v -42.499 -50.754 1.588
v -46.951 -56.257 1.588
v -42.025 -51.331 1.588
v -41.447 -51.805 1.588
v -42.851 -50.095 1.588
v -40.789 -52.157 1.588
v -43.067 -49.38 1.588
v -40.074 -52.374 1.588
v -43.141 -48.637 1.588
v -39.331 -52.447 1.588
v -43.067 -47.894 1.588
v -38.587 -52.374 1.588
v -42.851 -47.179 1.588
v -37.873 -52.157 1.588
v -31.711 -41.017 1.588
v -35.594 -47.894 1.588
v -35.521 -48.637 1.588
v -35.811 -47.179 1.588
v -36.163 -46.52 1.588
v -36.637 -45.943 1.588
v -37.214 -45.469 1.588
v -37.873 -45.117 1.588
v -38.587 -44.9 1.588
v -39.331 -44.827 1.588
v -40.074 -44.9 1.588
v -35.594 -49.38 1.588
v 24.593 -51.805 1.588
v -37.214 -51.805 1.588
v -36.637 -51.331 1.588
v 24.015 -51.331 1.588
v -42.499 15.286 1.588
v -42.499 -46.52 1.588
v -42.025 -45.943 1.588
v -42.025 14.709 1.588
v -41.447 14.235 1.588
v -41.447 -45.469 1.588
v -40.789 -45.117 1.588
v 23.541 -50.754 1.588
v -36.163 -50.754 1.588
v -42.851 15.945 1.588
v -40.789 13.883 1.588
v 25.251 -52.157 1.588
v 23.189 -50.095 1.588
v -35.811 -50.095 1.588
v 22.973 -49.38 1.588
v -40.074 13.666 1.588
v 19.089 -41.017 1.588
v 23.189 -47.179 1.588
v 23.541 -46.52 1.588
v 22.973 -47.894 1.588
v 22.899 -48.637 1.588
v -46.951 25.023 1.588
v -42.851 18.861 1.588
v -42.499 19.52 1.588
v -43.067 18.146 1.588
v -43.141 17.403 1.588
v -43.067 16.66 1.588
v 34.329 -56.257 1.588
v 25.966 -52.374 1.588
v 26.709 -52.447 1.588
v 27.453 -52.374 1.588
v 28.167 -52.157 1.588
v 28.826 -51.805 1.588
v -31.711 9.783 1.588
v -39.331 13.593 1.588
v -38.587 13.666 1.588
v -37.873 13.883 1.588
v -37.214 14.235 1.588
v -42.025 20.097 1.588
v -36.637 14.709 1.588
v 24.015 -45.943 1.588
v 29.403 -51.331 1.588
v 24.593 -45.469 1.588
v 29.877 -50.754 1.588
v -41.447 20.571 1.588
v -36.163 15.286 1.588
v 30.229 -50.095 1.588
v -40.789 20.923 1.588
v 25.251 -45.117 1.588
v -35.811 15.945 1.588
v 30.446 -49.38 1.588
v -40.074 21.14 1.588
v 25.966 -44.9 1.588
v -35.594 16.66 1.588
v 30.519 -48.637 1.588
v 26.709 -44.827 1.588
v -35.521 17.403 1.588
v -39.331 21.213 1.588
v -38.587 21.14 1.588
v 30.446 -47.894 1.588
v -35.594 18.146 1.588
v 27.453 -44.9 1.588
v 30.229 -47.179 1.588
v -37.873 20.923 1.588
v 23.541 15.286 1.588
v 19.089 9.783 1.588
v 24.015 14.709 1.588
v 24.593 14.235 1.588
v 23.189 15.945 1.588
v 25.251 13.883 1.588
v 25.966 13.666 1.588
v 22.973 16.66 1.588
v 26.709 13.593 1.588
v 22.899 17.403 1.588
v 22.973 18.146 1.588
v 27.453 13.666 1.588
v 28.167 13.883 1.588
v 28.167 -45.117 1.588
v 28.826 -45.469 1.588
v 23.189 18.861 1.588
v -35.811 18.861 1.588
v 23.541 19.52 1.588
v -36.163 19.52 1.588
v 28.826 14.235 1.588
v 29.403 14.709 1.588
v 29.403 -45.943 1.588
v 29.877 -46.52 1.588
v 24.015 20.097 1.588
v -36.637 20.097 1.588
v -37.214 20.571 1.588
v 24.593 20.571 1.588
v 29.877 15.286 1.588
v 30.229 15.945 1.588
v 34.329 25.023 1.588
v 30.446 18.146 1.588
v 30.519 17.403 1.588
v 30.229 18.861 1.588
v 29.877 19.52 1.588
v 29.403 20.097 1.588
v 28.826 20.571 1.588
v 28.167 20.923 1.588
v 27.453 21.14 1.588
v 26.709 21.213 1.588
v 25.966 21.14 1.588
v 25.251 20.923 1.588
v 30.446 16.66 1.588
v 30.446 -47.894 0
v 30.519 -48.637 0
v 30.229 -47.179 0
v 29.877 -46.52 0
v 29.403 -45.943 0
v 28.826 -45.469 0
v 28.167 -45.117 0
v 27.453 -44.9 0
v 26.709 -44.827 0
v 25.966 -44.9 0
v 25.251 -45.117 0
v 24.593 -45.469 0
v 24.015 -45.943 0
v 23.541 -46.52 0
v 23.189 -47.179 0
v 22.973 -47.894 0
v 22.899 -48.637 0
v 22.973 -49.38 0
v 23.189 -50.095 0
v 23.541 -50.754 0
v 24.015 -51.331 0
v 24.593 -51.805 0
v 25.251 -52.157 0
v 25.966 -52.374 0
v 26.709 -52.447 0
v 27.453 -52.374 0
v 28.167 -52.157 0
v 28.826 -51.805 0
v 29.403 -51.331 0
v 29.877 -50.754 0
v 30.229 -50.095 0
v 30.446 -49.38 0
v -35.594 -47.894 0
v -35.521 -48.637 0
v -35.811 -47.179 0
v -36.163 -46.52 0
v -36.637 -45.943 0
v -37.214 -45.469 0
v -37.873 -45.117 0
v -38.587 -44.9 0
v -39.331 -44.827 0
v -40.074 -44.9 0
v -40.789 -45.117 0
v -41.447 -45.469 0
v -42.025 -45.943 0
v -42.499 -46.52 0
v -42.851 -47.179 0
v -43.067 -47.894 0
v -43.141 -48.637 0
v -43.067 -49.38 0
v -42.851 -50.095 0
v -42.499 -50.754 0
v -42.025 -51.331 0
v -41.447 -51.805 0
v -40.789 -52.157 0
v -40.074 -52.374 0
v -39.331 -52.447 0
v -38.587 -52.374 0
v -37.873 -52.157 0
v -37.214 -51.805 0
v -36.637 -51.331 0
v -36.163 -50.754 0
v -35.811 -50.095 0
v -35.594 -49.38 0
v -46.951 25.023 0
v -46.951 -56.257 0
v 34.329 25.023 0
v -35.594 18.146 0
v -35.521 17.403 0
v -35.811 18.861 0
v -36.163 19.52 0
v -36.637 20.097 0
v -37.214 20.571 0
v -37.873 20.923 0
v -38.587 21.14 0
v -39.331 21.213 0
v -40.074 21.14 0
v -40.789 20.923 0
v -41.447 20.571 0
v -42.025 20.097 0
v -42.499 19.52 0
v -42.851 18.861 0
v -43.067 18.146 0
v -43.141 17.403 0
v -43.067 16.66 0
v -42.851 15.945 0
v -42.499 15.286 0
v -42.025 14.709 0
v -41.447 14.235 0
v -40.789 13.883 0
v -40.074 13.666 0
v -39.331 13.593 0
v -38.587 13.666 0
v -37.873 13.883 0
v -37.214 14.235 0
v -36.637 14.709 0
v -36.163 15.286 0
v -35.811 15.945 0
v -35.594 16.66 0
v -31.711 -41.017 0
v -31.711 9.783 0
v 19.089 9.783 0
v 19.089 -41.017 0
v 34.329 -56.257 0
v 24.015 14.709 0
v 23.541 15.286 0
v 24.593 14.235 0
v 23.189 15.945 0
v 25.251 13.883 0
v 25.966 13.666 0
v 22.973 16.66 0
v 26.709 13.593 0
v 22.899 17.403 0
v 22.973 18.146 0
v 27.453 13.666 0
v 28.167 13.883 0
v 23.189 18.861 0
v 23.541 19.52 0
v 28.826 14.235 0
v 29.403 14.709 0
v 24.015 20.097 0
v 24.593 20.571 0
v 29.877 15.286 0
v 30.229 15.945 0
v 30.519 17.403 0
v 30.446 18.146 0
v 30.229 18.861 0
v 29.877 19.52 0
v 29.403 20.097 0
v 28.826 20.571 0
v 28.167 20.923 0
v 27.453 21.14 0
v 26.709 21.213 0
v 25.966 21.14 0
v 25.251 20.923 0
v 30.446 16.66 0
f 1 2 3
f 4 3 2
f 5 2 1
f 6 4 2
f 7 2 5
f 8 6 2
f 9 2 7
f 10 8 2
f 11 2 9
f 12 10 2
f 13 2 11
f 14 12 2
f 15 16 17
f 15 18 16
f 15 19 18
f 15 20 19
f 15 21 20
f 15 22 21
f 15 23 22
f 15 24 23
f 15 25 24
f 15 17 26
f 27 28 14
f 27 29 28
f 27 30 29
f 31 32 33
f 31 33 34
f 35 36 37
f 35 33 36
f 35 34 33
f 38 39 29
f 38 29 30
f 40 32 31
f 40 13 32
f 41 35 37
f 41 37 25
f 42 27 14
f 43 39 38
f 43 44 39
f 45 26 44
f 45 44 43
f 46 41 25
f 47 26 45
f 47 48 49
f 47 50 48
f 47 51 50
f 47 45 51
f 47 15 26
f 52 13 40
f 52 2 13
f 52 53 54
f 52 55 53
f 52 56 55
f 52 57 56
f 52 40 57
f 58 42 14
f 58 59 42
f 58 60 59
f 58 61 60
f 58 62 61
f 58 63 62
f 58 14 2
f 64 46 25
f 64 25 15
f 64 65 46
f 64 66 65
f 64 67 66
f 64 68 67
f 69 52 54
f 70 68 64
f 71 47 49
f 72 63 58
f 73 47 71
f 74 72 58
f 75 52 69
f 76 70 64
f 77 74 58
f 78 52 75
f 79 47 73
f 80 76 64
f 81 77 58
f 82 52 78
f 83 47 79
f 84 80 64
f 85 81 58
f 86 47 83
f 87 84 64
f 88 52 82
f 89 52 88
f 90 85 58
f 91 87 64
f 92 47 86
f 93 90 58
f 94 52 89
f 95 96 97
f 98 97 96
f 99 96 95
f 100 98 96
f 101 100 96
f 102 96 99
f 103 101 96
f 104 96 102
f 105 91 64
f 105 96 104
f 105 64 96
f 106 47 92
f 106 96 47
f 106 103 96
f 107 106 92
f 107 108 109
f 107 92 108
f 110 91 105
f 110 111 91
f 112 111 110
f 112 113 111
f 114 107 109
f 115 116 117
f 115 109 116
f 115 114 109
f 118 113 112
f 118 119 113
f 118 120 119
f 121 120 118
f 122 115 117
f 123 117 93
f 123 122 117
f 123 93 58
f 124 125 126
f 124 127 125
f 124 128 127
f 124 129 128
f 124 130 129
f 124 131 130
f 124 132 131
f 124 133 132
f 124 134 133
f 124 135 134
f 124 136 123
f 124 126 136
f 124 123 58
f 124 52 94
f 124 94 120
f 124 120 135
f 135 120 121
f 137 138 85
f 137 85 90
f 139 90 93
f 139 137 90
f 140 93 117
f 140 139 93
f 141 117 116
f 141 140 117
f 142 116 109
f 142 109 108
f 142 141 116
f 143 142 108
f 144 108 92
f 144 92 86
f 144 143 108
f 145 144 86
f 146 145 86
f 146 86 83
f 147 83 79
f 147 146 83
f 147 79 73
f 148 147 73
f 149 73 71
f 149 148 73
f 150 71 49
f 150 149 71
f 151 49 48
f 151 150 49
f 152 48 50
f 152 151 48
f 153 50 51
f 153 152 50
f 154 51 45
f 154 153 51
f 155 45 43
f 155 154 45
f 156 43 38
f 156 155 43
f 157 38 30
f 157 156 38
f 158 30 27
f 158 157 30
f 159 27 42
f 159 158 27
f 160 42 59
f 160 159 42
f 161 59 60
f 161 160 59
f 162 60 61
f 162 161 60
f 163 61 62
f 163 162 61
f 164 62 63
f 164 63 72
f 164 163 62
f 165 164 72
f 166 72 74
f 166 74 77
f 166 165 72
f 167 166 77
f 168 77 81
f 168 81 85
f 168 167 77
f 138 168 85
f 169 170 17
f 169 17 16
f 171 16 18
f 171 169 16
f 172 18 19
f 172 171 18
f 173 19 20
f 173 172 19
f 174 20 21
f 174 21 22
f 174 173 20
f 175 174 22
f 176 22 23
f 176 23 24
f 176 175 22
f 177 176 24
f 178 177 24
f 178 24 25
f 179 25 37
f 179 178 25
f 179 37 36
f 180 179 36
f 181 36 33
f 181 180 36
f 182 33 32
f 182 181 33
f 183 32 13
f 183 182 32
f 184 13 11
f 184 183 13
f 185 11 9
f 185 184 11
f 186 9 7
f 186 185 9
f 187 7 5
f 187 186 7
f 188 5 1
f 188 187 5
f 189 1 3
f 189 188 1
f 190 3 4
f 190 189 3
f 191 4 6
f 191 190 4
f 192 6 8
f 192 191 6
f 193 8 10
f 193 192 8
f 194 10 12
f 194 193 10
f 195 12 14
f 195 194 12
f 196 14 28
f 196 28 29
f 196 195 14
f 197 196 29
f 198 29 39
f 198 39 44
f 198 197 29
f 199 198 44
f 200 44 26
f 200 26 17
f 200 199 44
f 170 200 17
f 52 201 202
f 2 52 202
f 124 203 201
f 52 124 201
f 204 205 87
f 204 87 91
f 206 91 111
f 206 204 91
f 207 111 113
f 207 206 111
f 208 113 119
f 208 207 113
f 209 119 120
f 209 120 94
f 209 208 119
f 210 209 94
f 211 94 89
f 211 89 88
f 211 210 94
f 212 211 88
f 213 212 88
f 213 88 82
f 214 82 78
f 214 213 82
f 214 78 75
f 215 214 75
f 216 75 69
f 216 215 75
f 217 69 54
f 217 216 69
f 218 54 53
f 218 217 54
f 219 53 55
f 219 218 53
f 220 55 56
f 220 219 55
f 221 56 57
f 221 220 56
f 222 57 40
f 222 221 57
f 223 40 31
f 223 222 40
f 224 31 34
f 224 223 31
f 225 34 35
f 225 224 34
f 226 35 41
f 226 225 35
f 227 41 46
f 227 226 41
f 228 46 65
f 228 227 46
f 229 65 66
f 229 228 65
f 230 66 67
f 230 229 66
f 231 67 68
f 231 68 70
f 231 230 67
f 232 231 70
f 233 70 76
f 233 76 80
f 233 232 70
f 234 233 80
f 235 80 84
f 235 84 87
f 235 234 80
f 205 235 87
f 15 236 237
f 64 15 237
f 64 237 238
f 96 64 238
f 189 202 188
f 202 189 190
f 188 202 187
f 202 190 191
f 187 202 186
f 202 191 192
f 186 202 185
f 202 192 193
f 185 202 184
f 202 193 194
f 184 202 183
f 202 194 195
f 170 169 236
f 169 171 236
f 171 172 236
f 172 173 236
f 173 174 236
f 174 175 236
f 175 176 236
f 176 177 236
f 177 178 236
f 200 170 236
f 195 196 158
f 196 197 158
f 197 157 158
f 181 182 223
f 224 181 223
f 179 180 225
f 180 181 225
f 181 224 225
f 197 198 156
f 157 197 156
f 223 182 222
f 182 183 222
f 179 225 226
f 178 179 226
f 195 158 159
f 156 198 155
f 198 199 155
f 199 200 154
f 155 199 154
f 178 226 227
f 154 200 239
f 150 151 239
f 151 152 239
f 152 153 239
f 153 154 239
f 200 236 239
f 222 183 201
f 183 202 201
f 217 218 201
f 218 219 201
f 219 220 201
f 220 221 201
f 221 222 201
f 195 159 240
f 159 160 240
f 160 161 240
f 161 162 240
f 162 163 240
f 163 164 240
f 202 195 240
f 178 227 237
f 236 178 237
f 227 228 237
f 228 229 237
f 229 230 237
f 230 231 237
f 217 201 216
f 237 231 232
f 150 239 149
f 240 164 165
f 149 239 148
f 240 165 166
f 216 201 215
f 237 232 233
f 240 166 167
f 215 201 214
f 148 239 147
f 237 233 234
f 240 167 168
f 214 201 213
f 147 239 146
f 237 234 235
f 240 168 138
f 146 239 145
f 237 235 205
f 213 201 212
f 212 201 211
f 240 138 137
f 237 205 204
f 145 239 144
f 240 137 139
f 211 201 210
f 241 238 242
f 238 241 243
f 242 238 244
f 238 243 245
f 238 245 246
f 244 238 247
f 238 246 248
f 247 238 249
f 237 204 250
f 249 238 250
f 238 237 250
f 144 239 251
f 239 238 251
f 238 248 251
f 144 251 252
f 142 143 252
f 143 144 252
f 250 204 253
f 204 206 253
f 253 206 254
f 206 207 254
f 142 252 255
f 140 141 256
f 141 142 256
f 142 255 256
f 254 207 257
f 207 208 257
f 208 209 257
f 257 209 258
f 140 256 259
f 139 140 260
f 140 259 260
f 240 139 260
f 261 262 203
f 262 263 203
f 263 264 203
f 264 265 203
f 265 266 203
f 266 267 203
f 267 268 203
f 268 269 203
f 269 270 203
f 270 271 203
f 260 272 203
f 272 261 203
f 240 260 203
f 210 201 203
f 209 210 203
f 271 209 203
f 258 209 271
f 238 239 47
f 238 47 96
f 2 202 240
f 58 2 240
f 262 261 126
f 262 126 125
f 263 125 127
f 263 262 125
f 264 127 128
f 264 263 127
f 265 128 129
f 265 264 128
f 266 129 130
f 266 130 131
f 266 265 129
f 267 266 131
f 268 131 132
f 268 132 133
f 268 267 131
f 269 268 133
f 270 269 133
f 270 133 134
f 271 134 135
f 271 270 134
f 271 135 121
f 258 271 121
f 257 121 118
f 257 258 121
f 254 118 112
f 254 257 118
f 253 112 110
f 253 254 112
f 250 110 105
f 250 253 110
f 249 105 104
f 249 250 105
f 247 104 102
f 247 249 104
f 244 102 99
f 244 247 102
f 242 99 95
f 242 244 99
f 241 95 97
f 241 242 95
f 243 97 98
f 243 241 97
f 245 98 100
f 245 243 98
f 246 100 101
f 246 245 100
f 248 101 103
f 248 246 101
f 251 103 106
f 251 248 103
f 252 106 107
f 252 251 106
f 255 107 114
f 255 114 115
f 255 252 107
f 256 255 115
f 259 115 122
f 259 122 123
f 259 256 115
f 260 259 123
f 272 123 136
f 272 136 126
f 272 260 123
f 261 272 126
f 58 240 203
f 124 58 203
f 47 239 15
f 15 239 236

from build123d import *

# Parameters (mm, degrees)
F0_W     = 15.24
F0_H     = 15.24
F0_R     = 3.81
F0_W_2   = 50.8
F0_H_2   = 50.8
F1_DEPTH = 1.5875


# Not quite as in the source:
# - a feature names something its author has since deleted; it is built from what else it names


with BuildPart() as f1:
    # F0 (on Top) → F1 (new body)
    with BuildSketch(Plane.XY):
        with Locations((-39.3306643713, -48.6370485475)):
            Rectangle(F0_W, F0_H)
        with Locations((-39.3306643713, -48.6370485475)):
            Circle(F0_R, mode=Mode.SUBTRACT)
        with Locations((26.7093356287, -48.6370485475)):
            Rectangle(F0_W, F0_H)
        with Locations((26.7093356287, -48.6370485475)):
            Circle(F0_R, mode=Mode.SUBTRACT)
        with Locations((-39.3306643713, 17.4029514525)):
            Rectangle(F0_W, F0_H)
        with Locations((-39.3306643713, 17.4029514525)):
            Circle(F0_R, mode=Mode.SUBTRACT)
        with Locations((26.7093356287, 17.4029514525)):
            Rectangle(F0_W, F0_H)
        with Locations((26.7093356287, 17.4029514525)):
            Circle(F0_R, mode=Mode.SUBTRACT)
        with Locations((-6.3106643713, 17.4029514525)):
            Rectangle(F0_W_2, F0_H)
        with Locations((-6.3106643713, -48.6370485475)):
            Rectangle(F0_W_2, F0_H)
        with Locations((-39.3306643713, -15.6170485475)):
            Rectangle(F0_W, F0_H_2)
        with Locations((26.7093356287, -15.6170485475)):
            Rectangle(F0_W, F0_H_2)
    extrude(amount=F1_DEPTH)


solid = f1.part
